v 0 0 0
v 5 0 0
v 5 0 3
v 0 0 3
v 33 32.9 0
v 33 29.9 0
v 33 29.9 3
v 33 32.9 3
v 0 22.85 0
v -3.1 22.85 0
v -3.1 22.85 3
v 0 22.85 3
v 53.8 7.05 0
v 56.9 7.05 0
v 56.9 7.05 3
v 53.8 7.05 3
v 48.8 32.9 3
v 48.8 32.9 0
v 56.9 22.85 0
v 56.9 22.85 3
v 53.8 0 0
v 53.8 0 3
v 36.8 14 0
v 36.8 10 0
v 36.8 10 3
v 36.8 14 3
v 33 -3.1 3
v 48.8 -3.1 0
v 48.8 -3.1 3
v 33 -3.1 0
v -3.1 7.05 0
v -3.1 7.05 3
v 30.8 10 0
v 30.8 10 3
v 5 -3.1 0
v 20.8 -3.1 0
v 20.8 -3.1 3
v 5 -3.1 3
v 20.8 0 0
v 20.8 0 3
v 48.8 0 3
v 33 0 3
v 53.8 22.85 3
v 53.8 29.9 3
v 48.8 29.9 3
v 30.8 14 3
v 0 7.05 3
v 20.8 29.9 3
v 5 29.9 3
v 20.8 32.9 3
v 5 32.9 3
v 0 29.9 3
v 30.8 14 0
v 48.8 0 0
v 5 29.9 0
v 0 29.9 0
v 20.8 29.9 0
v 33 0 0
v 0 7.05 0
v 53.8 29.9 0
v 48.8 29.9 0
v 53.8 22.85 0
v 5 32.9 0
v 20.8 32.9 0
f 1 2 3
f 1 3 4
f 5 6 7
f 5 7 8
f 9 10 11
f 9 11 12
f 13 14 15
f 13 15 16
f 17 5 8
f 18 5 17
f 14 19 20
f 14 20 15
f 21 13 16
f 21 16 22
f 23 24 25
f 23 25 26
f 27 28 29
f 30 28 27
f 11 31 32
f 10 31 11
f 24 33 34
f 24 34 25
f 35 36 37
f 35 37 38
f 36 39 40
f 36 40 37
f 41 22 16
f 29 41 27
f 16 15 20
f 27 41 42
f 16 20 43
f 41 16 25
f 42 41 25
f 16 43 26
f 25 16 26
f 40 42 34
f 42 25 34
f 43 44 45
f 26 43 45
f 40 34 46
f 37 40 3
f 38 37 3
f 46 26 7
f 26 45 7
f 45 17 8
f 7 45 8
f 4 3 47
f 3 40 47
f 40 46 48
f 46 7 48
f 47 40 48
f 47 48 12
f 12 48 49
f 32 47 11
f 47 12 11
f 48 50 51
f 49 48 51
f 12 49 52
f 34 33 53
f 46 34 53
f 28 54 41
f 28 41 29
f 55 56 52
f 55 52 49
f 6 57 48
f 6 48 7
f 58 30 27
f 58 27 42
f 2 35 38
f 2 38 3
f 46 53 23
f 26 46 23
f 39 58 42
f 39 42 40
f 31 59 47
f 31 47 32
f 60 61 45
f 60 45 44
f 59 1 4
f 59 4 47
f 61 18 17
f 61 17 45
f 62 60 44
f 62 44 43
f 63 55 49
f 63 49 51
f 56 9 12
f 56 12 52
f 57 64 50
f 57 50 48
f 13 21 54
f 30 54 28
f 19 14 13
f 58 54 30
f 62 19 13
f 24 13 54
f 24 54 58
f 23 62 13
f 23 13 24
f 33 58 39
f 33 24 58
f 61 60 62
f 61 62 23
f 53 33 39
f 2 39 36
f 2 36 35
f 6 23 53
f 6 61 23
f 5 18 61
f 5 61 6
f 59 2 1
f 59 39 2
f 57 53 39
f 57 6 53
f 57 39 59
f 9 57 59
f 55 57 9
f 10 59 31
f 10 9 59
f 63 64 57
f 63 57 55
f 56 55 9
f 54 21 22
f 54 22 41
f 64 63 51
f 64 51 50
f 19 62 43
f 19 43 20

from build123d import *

# Parameters (mm, degrees)
SKETCH1_W           = 6
SKETCH1_H           = 4
BOSS_EXTRUDE1_DEPTH = 3


with BuildPart() as part:
    # Sketch1 → Boss-Extrude1 (new body)
    with BuildSketch(Plane.XY):
        Polygon((0, 29.9), (5, 29.9), (5, 32.9), (20.8, 32.9), (20.8, 29.9), (33, 29.9), (33, 32.9), (48.8, 32.9), (48.8, 29.9), (53.8, 29.9), (53.8, 22.85), (56.9, 22.85), (56.9, 7.05), (53.8, 7.05), (53.8, 0), (48.8, 0), (48.8, -3.1), (33, -3.1), (33, 0), (20.8, 0), (20.8, -3.1), (5, -3.1), (5, 0), (0, 0), (0, 7.05), (-3.1, 7.05), (-3.1, 22.85), (0, 22.85), align=None)
        with Locations((33.8, 12)):
            Rectangle(SKETCH1_W, SKETCH1_H, mode=Mode.SUBTRACT)
    extrude(amount=BOSS_EXTRUDE1_DEPTH)


solid = part.part
